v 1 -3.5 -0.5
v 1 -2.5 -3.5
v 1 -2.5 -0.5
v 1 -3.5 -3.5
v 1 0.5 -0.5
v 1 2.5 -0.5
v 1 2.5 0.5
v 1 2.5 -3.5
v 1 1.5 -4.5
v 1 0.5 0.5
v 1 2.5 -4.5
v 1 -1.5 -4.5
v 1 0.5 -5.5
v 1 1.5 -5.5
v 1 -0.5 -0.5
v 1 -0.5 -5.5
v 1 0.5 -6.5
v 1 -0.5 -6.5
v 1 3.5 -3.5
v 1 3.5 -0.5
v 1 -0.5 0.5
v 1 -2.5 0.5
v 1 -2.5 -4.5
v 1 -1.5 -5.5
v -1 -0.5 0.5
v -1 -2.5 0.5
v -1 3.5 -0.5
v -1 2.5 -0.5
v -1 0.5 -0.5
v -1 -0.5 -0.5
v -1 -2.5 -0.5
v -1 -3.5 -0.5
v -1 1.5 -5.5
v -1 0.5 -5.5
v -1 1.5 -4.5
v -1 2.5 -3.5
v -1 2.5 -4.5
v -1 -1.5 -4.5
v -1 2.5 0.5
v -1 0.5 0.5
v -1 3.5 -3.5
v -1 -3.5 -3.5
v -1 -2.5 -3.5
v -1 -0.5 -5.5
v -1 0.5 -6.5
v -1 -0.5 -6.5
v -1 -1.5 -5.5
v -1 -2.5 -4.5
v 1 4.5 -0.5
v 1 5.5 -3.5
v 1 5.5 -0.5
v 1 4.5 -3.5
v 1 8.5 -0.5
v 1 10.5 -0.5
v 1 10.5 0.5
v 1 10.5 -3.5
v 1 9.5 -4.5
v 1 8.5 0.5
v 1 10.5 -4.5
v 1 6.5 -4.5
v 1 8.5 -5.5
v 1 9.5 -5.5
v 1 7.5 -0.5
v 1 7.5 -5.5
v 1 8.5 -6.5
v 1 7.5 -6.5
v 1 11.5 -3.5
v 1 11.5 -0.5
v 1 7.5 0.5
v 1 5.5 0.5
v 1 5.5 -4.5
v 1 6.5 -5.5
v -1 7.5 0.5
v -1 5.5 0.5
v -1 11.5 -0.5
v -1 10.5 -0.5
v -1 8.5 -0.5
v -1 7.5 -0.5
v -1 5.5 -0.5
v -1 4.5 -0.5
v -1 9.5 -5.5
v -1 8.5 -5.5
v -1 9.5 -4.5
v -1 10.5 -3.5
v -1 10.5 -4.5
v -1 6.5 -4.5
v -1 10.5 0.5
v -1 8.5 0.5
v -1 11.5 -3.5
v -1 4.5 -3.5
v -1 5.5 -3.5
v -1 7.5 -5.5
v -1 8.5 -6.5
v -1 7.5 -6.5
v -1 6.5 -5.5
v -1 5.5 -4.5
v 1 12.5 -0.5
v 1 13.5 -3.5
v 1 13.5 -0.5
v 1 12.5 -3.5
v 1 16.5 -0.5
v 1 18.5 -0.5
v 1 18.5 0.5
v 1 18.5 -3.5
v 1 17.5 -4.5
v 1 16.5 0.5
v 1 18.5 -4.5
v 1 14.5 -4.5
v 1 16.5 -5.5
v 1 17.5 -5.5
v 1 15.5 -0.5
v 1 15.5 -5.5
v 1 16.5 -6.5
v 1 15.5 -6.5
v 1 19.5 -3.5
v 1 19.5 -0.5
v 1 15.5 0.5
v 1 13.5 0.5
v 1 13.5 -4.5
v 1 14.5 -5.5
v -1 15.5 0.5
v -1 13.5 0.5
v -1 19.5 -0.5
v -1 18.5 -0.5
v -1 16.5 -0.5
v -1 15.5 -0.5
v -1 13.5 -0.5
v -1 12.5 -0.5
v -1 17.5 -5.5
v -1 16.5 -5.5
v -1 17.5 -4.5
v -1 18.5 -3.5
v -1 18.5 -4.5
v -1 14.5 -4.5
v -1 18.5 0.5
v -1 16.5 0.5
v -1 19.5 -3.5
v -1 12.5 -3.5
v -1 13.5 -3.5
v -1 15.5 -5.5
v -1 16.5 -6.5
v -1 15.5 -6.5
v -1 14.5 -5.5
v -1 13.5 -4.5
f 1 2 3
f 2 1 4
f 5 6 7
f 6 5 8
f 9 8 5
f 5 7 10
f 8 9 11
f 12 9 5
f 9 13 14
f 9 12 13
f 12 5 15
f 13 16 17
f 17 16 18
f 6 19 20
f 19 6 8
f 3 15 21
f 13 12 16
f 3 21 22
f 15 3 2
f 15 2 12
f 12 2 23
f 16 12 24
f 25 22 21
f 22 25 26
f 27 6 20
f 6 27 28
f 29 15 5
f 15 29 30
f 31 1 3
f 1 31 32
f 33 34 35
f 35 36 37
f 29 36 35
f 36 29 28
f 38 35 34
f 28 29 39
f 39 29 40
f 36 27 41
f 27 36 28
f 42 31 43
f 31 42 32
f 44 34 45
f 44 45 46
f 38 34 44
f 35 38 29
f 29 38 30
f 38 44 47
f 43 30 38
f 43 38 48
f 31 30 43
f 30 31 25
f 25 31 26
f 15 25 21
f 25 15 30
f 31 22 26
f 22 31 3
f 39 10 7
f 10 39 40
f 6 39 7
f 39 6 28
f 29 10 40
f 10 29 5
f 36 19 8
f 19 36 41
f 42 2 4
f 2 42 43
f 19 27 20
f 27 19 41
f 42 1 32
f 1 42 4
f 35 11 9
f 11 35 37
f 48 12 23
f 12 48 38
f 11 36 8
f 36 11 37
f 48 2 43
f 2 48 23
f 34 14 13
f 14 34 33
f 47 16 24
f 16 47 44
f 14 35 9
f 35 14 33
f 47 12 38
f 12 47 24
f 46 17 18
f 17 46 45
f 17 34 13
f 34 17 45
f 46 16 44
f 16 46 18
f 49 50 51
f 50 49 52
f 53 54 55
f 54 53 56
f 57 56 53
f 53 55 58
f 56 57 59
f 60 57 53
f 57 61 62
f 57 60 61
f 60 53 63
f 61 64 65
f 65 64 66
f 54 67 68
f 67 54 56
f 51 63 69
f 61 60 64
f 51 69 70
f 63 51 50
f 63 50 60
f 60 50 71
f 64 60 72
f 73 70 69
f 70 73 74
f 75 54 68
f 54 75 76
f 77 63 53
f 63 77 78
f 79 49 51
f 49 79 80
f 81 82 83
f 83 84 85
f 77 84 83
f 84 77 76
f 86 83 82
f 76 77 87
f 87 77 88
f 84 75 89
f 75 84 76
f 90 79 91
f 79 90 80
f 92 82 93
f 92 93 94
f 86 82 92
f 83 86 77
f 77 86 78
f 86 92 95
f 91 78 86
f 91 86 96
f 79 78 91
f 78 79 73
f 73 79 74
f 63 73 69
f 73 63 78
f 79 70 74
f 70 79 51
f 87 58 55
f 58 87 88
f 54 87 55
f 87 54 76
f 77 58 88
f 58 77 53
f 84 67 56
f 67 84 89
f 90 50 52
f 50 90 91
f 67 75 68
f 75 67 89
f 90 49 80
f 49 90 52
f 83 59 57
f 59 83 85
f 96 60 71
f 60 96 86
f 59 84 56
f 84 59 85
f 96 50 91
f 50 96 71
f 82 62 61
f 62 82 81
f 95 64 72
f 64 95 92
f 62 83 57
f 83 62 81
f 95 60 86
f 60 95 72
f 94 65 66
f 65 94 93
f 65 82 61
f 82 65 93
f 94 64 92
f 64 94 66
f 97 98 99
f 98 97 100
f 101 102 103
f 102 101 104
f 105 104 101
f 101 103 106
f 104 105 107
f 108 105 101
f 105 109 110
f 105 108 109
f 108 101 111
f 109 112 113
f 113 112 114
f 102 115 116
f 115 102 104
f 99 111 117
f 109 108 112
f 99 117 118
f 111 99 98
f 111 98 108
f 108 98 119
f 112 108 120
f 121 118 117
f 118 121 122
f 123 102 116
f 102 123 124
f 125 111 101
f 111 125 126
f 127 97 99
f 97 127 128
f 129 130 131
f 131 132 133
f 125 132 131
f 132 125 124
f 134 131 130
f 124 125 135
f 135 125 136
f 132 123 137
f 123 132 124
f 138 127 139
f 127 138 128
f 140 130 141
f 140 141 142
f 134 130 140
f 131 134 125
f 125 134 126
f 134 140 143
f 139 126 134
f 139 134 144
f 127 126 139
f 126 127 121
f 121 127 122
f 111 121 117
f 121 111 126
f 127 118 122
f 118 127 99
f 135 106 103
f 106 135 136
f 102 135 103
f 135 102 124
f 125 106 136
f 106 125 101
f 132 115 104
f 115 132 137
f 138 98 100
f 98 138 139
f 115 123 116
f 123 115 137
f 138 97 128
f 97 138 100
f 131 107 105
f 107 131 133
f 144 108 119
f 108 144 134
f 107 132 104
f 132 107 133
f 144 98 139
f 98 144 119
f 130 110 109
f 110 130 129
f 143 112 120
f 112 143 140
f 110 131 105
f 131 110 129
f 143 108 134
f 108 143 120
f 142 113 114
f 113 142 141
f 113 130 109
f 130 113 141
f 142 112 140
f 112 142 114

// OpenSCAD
for (i = [0:2]) translate([0, 8*i, 0]) {
  translate([0, -1.5, 0]) cube(size=[2, 2, 1], center=true);

  translate([0, 1.5, 0]) cube(size=[2, 2, 1], center=true);

  translate([0, 0, -2.0]) cube(size=[2, 7, 3], center=true);

  translate([0, 0, -4]) cube(size=[2, 5, 1], center=true);

  translate([0, 0, -5]) cube(size=[2, 3, 1], center=true);

  translate([0, 0, -6]) cube(size=[2, 1, 1], center=true);  
}
